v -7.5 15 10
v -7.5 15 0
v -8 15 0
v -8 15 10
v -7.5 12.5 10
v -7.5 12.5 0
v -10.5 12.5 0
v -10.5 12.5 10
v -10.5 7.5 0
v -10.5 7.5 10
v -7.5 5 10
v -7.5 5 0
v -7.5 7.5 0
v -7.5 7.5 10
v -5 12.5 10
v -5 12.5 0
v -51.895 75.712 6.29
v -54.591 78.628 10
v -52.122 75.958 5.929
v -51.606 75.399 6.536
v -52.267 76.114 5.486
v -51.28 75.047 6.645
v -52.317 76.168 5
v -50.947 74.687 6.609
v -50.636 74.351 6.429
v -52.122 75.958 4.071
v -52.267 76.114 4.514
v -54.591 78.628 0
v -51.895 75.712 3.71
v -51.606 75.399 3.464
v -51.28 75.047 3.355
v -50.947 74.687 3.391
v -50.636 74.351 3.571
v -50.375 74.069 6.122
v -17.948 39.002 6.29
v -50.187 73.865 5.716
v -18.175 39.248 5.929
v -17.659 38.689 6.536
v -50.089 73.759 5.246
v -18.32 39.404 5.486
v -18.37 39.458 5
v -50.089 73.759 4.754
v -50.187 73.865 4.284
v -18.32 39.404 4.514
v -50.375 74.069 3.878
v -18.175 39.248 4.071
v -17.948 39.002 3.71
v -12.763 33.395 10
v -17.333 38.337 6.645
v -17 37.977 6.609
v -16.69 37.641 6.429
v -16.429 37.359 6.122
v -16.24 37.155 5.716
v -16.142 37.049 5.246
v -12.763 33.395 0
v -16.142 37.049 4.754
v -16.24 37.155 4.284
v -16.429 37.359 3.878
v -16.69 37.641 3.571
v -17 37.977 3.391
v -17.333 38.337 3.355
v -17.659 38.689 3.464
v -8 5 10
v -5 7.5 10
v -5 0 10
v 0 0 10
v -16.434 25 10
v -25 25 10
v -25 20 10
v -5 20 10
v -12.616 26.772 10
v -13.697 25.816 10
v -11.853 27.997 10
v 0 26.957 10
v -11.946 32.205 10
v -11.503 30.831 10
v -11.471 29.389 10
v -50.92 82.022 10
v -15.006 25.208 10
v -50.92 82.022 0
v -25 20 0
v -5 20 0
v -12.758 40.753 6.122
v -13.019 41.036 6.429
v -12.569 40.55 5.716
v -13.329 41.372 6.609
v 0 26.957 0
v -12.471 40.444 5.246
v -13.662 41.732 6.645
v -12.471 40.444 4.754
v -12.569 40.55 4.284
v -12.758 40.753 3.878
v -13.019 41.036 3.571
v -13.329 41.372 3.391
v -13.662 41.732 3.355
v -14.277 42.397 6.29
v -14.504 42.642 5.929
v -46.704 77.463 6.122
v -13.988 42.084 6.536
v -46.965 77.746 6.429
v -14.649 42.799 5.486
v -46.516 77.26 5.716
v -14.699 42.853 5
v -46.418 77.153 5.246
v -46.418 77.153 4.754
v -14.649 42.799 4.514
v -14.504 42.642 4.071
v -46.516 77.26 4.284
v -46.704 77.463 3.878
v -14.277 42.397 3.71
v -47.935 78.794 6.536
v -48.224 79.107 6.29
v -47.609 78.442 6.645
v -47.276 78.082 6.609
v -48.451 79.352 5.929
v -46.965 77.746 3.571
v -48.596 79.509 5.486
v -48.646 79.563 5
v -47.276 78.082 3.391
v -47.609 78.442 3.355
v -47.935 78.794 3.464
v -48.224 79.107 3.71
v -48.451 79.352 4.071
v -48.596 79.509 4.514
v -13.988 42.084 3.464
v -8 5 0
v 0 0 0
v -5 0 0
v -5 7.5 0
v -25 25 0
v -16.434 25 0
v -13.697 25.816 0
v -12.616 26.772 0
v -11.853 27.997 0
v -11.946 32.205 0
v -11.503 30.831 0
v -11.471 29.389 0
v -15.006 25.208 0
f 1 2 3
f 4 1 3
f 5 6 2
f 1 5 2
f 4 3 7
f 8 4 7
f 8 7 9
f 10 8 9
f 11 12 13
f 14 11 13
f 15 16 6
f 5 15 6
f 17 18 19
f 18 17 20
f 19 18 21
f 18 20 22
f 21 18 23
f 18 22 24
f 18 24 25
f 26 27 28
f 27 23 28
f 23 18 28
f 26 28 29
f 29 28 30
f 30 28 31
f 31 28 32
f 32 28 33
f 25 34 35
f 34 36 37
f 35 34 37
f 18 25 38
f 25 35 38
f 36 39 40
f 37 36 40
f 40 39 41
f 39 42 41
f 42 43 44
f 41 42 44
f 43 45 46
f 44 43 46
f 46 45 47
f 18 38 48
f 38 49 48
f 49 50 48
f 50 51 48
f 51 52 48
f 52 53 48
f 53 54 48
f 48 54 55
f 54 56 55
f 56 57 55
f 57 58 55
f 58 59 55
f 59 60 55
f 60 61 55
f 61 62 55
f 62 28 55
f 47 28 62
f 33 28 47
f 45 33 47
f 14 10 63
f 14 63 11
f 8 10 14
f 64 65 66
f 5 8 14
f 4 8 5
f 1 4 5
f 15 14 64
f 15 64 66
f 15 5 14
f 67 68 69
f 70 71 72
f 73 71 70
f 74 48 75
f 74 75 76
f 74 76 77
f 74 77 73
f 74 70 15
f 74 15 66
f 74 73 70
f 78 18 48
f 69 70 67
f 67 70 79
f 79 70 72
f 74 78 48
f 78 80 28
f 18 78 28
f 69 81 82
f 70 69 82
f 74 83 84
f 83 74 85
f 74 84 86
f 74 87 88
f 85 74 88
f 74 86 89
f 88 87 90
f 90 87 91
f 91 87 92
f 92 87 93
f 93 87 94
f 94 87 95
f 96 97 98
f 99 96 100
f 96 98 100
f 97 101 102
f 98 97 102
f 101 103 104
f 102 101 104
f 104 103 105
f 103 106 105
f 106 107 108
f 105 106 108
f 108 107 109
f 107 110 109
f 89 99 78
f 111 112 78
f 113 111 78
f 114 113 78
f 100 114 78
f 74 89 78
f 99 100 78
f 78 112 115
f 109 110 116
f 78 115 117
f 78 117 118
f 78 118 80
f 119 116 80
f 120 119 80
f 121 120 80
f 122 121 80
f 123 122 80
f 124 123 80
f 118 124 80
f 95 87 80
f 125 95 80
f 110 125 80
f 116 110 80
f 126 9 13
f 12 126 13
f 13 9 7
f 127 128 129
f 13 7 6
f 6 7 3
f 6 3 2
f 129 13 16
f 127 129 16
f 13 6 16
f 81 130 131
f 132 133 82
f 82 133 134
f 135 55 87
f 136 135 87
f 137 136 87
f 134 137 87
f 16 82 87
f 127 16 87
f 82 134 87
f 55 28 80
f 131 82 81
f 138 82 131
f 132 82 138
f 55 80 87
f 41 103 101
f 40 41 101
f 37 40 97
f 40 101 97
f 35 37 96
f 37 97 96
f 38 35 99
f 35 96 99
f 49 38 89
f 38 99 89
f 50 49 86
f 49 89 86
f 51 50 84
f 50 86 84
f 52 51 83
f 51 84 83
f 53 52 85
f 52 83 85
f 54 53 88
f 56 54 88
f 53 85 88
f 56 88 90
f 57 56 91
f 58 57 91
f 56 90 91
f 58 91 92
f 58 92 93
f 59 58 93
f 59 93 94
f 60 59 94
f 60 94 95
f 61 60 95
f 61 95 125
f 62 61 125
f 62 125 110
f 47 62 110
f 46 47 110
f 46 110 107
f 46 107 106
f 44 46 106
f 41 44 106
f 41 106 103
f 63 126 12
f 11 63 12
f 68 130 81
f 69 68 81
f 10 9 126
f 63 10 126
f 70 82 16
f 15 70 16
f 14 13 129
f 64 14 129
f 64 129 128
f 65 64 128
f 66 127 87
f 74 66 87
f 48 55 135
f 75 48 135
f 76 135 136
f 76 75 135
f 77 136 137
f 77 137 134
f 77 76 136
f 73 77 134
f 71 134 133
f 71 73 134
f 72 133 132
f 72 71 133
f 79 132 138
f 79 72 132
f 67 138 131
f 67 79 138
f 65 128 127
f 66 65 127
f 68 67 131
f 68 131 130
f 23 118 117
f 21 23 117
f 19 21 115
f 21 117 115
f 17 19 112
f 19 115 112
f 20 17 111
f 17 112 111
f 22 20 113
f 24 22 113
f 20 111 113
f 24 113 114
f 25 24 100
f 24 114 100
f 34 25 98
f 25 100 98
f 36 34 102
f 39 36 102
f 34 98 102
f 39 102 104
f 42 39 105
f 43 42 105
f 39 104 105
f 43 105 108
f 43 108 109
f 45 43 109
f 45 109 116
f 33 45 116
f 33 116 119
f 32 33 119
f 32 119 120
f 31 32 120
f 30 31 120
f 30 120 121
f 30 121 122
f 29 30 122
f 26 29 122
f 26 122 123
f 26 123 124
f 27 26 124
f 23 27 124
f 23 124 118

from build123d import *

# Parameters (mm, degrees)
F1_DEPTH = 10
F2_R     = 5
F3_R     = 1.65
F4_DEPTH = 58.3841123594
F5_DEPTH = 25


with BuildPart() as f1:
    # F0 (on Top) → F1 (new body)
    with BuildSketch(Plane.XY):
        Polygon((-25, 25), (-25, 20), (-5, 20), (-5, 12.5), (-7.5, 12.5), (-7.5, 15), (-8, 15), (-10.5, 12.5), (-10.5, 7.5), (-8, 5), (-7.5, 5), (-7.5, 7.5), (-5, 7.5), (-5, 0), (0, 0), (0, 26.9574919131), (-50.9201724728, 82.0223267475), (-54.5911614618, 78.6276485826), (-5, 25), align=None)
    extrude(amount=F1_DEPTH)

    # F2
    f2_edges = [f1.edges().sort_by_distance(p)[0] for p in [
        (-5, 25, 5),
    ]]
    fillet(f2_edges, radius=F2_R)

    # F3 (on face) → F4 (cut, through all)
    with BuildSketch(Plane(origin=(13.4375831218, 12.4261527749, 0), x_dir=(-0.678935633, 0.7341977978, 0), z_dir=(0.7341977978, 0.678935633, 0))):
        with Locations((89.7921311966, 5)):
            Circle(F3_R)
    extrude(amount=-F4_DEPTH, mode=Mode.SUBTRACT)

    # F3 (on face) → F5 (cut)
    with BuildSketch(Plane(origin=(13.4375831218, 12.4261527749, 0), x_dir=(-0.678935633, 0.7341977978, 0), z_dir=(0.7341977978, 0.678935633, 0))):
        with Locations((39.7921311966, 5)):
            Circle(F3_R)
    extrude(amount=-F5_DEPTH, mode=Mode.SUBTRACT)


solid = f1.part
